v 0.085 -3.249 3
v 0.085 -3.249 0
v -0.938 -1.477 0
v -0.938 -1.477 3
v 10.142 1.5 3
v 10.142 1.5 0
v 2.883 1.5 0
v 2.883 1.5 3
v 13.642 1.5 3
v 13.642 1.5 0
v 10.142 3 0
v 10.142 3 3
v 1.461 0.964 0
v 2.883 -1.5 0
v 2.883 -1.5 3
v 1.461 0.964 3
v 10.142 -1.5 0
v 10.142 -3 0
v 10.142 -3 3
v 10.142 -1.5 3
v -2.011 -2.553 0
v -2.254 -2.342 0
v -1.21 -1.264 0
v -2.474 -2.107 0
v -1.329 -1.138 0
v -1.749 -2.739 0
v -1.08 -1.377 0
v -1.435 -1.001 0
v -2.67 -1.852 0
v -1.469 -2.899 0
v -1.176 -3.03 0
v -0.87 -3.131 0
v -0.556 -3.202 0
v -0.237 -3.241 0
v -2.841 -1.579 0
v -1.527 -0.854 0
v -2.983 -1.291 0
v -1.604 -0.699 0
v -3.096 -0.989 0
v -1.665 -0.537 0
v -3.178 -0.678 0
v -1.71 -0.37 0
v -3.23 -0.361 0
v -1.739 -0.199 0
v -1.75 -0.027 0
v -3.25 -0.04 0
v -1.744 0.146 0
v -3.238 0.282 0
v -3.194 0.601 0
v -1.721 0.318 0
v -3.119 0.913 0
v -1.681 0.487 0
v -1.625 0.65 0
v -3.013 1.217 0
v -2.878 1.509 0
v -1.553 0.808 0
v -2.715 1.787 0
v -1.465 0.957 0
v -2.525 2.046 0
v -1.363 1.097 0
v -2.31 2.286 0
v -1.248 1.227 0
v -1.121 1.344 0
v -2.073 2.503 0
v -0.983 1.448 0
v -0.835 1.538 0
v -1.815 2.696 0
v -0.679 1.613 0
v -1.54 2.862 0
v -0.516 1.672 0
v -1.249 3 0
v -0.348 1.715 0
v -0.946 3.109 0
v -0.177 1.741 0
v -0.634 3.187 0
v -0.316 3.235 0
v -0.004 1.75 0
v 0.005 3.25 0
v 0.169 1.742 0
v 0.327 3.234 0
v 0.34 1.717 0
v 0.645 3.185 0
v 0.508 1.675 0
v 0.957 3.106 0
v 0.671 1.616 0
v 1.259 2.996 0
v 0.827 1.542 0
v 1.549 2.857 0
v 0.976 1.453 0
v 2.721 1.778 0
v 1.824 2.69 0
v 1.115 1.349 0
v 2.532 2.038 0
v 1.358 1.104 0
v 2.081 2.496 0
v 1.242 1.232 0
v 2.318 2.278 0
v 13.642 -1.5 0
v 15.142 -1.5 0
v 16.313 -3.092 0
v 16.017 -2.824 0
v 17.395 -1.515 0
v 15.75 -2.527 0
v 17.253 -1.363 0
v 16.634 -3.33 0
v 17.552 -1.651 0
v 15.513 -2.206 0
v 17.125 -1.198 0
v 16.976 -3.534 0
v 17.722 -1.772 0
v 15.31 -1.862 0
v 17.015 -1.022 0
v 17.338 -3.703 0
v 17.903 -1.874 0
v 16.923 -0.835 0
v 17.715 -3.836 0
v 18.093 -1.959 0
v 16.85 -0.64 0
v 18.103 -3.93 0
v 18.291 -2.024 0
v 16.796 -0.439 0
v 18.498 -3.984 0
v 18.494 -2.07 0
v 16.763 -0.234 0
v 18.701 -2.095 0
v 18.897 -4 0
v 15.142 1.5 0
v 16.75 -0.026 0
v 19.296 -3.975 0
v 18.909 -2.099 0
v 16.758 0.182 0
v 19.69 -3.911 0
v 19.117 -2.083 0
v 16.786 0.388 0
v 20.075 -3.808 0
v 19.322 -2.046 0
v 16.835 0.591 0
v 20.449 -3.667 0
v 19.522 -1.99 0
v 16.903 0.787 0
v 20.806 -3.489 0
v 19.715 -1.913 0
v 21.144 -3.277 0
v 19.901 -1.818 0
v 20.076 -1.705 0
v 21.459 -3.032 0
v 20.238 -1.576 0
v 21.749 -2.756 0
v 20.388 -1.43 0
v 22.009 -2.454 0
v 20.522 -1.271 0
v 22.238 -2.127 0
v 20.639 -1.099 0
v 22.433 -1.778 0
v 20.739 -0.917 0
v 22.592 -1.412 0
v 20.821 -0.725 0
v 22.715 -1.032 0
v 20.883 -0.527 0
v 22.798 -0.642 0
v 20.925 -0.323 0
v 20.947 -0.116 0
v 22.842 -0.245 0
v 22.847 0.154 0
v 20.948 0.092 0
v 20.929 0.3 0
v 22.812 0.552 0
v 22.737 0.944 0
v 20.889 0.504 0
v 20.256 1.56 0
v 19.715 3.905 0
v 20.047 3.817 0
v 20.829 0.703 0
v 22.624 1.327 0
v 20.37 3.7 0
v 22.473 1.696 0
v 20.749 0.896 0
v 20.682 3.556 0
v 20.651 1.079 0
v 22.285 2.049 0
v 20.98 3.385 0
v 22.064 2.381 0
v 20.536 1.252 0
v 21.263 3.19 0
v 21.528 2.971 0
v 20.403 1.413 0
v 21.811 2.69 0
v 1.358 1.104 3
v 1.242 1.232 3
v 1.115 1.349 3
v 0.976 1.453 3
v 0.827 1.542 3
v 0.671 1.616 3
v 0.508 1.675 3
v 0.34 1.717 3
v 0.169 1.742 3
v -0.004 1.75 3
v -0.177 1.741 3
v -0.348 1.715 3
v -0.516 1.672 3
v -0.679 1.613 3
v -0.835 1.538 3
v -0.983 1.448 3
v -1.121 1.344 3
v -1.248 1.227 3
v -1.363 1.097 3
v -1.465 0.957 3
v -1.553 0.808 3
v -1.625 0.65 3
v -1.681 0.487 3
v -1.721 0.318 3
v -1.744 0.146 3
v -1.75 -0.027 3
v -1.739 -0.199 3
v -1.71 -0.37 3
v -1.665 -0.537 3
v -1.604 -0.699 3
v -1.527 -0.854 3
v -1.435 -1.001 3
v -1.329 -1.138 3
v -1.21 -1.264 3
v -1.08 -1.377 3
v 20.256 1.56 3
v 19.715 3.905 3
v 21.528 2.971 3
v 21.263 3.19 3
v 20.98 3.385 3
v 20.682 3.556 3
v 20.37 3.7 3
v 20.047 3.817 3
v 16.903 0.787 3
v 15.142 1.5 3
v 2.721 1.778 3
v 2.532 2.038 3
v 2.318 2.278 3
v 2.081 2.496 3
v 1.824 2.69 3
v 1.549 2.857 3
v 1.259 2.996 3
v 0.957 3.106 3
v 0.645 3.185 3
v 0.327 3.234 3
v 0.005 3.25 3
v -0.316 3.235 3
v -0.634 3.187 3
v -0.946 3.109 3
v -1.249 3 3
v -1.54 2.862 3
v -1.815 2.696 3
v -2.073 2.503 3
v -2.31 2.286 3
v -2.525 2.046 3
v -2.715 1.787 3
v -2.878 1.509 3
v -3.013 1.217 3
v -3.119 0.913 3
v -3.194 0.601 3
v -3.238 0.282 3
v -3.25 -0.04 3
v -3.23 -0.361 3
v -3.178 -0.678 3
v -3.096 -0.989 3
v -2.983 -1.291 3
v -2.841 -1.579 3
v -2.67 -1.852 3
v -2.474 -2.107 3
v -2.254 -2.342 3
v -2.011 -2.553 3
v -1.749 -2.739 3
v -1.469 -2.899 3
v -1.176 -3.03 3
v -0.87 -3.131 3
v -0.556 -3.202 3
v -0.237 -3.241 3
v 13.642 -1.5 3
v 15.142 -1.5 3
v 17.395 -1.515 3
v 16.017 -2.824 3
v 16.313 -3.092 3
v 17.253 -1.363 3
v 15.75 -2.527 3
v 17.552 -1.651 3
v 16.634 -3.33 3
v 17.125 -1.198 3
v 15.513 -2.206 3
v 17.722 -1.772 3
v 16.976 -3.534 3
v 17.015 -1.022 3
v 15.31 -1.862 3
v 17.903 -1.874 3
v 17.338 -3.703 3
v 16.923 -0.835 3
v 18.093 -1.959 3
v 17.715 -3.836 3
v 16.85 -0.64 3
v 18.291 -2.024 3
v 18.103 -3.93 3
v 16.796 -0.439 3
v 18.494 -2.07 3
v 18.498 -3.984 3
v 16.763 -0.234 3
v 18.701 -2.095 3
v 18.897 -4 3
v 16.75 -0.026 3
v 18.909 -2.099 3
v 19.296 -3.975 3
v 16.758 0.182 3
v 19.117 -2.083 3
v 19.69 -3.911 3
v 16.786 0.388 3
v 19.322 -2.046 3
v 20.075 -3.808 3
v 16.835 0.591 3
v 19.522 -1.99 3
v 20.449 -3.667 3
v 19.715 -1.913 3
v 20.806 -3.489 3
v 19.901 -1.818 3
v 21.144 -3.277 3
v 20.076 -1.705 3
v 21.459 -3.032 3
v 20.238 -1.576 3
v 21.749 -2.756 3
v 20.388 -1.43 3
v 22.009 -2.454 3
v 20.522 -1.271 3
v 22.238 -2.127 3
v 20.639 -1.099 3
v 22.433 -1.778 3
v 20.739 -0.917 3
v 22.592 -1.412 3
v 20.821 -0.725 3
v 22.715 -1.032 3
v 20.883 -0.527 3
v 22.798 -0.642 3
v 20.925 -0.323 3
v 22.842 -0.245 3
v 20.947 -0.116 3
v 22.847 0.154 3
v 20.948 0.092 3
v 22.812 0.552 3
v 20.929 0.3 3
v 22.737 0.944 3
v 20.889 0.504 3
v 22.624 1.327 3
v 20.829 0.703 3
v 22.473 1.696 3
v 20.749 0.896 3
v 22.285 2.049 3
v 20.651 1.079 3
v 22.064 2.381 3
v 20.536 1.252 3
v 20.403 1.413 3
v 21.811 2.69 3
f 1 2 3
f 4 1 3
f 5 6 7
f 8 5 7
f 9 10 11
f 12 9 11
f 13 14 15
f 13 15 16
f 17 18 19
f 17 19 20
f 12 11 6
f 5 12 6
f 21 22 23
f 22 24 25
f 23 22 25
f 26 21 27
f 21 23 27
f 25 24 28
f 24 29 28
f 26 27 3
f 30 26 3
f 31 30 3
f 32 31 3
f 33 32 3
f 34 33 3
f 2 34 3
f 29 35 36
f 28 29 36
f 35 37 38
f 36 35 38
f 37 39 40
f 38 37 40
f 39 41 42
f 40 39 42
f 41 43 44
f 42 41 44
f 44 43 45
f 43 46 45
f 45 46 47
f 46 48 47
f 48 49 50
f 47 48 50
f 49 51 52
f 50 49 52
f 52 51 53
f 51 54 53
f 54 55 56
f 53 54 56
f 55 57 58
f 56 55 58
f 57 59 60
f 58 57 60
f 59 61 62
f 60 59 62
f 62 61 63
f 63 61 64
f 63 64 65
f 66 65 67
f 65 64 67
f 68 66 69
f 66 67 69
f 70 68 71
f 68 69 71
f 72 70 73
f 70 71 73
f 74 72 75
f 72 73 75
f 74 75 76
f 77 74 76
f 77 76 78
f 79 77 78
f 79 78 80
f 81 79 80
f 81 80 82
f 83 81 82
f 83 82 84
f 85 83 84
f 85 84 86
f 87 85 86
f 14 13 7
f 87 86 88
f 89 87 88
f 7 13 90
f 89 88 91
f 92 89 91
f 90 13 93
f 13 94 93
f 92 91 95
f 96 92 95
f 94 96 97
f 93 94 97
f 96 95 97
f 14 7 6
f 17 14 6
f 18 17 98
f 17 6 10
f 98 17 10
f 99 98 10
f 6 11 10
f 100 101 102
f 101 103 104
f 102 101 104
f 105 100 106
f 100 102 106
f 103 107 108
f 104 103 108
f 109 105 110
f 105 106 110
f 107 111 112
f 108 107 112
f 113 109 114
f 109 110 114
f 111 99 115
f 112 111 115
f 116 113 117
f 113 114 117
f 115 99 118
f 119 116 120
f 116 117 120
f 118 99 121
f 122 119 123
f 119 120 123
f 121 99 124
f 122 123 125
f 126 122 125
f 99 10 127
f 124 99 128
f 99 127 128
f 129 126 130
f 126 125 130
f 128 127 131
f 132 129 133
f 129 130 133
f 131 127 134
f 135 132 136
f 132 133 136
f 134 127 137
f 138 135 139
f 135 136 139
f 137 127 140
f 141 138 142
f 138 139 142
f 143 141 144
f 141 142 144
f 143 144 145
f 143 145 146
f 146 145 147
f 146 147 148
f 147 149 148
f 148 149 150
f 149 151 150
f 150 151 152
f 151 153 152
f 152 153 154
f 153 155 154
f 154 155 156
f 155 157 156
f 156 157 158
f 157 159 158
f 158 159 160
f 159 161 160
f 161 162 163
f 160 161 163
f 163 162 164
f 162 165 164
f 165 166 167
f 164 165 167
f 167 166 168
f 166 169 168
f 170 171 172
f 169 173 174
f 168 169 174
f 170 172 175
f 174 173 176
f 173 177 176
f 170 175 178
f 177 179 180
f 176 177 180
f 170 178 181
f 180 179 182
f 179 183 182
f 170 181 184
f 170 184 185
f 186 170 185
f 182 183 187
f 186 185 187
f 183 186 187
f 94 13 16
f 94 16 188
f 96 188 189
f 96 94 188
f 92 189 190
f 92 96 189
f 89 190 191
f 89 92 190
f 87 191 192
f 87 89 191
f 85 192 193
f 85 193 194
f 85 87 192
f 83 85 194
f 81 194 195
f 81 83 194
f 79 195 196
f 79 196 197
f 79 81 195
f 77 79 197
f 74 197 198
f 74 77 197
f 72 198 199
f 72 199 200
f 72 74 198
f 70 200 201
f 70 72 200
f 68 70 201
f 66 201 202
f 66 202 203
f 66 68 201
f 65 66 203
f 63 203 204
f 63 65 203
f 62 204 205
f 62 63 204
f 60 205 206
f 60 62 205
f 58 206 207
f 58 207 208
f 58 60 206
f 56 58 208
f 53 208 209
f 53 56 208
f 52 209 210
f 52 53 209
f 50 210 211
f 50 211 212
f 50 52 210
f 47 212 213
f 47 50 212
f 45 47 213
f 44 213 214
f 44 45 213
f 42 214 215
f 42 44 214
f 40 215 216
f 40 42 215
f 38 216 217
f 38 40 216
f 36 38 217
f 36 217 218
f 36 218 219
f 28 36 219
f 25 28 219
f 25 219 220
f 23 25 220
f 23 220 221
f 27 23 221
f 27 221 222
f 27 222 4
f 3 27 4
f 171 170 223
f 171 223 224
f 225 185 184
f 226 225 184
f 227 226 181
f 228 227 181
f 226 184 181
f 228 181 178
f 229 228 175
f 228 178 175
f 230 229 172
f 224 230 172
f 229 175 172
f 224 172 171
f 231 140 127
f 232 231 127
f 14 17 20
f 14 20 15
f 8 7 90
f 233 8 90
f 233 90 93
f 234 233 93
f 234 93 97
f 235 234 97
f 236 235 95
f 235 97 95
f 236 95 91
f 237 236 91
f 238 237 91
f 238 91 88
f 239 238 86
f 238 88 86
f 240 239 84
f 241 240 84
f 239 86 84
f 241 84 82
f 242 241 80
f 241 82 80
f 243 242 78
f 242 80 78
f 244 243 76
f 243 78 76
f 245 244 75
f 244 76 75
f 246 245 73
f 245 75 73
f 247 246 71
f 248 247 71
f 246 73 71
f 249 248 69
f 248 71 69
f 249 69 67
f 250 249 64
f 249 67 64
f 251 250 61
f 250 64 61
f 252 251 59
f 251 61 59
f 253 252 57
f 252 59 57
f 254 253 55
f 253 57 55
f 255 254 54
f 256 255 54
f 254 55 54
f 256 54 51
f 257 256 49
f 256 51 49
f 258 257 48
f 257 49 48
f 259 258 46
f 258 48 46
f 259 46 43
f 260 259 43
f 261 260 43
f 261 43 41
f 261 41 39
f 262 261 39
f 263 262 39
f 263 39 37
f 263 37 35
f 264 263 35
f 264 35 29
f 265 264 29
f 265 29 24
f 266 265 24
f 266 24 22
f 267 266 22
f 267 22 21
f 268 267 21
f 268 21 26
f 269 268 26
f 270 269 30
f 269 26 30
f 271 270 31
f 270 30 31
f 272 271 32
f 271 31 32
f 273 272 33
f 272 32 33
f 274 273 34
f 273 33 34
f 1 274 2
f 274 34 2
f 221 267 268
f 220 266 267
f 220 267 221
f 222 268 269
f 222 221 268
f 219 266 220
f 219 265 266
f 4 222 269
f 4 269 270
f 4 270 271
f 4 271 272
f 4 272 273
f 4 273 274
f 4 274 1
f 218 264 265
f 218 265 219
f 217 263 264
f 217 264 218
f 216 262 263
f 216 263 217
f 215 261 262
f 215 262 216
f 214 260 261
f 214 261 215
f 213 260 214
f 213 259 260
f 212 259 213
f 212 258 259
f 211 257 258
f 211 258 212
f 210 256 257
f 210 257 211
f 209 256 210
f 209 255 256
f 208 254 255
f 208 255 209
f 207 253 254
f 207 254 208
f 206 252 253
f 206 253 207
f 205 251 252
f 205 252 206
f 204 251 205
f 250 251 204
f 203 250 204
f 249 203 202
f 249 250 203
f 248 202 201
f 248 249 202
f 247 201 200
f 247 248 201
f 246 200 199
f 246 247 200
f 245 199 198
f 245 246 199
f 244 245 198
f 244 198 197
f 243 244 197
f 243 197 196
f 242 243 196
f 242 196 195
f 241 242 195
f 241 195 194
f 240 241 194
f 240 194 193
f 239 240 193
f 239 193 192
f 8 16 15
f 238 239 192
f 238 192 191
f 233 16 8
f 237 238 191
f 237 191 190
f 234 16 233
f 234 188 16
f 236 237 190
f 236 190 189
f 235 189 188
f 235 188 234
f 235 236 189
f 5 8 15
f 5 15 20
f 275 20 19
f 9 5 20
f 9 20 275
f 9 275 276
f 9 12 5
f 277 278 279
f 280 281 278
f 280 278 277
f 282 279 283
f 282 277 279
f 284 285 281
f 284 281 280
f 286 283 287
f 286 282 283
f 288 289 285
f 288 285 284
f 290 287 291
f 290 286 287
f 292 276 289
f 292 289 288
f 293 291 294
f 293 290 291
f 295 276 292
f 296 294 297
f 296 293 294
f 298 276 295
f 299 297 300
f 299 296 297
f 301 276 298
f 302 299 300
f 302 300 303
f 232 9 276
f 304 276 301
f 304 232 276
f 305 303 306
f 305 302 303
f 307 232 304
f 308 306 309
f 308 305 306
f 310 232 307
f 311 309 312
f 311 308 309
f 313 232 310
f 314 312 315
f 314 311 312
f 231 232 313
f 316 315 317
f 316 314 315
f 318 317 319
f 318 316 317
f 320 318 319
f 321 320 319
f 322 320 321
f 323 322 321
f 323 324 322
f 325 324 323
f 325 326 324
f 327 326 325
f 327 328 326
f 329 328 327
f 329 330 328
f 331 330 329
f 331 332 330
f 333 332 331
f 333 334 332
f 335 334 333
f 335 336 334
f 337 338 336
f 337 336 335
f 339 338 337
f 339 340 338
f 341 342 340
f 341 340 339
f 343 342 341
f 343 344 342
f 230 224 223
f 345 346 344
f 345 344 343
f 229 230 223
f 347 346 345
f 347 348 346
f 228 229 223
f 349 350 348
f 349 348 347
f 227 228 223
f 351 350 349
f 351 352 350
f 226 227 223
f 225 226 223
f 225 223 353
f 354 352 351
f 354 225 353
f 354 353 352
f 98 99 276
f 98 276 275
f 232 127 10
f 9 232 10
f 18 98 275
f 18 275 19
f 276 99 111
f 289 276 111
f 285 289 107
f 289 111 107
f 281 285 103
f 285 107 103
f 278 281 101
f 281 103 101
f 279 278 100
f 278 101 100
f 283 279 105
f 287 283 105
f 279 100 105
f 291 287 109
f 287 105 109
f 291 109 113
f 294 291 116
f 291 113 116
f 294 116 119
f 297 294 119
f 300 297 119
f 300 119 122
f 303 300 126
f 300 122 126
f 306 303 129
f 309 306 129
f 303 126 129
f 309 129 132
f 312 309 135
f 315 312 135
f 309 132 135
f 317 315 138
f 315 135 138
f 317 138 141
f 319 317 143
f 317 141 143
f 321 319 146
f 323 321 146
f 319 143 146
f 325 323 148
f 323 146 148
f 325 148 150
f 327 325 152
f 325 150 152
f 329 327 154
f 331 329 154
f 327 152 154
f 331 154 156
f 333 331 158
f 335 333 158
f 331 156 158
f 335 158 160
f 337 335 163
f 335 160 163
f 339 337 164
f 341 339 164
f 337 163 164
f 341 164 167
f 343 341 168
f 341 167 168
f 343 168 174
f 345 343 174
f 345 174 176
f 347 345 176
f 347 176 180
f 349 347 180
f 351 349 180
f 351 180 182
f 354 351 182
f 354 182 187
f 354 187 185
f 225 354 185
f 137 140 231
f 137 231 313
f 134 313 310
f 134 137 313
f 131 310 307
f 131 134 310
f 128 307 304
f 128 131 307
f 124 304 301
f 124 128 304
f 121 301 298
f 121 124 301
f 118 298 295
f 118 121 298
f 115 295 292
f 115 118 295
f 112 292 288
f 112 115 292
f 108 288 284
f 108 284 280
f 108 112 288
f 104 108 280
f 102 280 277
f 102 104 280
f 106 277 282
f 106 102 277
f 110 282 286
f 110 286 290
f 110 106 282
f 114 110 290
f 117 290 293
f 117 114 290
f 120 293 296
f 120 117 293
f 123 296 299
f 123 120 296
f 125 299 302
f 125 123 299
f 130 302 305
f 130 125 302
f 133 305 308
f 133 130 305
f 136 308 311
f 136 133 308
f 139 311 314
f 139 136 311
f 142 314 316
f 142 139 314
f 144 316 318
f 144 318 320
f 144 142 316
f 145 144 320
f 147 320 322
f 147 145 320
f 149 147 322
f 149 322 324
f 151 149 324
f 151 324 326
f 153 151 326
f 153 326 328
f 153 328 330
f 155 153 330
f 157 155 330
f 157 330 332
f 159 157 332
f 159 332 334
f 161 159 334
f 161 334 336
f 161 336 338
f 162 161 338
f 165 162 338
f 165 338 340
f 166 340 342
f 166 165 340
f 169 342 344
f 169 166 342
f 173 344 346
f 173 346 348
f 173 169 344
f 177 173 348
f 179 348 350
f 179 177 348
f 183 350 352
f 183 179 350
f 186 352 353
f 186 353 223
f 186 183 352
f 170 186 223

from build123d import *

# Parameters (mm, degrees)
PAD_DEPTH = 3


with BuildPart() as part:
    # Sketch → Pad (new body)
    with BuildSketch(Plane.XY):
        with BuildLine():
            ThreePointArc((15.141901, -1.5), (21.144306, -3.276608), (21.527784, 2.971443))
            ThreePointArc((21.527784, 2.971443), (20.682106, 3.555754), (19.715442, 3.905254))
            Line((20.255836, 1.560008), (19.715442, 3.905254))
            ThreePointArc((16.903248, 0.7875), (19.321529, -2.046377), (20.255836, 1.560008))
            Line((16.903248, 0.7875), (15.141901, 1.5))
            Line((15.141901, 1.5), (13.641901, 1.5))
            Line((13.641901, 1.5), (10.141901, 3))
            Line((10.141901, 3), (10.141901, 1.5))
            Line((10.141901, 1.5), (2.883141, 1.5))
            ThreePointArc((2.883141, 1.5), (-2.8, 1.65), (0.084684, -3.248897))
            Line((0.084684, -3.248897), (-0.938159, -1.47728))
            ThreePointArc((1.460552, 0.963995), (-1.248271, 1.226507), (-0.938159, -1.47728))
            Line((2.883141, -1.5), (1.460552, 0.963995))
            Line((10.141901, -1.5), (2.883141, -1.5))
            Line((10.141901, -3), (10.141901, -1.5))
            Line((13.641901, -1.5), (10.141901, -3))
            Line((15.141901, -1.5), (13.641901, -1.5))
        make_face()
    extrude(amount=PAD_DEPTH)


solid = part.part
